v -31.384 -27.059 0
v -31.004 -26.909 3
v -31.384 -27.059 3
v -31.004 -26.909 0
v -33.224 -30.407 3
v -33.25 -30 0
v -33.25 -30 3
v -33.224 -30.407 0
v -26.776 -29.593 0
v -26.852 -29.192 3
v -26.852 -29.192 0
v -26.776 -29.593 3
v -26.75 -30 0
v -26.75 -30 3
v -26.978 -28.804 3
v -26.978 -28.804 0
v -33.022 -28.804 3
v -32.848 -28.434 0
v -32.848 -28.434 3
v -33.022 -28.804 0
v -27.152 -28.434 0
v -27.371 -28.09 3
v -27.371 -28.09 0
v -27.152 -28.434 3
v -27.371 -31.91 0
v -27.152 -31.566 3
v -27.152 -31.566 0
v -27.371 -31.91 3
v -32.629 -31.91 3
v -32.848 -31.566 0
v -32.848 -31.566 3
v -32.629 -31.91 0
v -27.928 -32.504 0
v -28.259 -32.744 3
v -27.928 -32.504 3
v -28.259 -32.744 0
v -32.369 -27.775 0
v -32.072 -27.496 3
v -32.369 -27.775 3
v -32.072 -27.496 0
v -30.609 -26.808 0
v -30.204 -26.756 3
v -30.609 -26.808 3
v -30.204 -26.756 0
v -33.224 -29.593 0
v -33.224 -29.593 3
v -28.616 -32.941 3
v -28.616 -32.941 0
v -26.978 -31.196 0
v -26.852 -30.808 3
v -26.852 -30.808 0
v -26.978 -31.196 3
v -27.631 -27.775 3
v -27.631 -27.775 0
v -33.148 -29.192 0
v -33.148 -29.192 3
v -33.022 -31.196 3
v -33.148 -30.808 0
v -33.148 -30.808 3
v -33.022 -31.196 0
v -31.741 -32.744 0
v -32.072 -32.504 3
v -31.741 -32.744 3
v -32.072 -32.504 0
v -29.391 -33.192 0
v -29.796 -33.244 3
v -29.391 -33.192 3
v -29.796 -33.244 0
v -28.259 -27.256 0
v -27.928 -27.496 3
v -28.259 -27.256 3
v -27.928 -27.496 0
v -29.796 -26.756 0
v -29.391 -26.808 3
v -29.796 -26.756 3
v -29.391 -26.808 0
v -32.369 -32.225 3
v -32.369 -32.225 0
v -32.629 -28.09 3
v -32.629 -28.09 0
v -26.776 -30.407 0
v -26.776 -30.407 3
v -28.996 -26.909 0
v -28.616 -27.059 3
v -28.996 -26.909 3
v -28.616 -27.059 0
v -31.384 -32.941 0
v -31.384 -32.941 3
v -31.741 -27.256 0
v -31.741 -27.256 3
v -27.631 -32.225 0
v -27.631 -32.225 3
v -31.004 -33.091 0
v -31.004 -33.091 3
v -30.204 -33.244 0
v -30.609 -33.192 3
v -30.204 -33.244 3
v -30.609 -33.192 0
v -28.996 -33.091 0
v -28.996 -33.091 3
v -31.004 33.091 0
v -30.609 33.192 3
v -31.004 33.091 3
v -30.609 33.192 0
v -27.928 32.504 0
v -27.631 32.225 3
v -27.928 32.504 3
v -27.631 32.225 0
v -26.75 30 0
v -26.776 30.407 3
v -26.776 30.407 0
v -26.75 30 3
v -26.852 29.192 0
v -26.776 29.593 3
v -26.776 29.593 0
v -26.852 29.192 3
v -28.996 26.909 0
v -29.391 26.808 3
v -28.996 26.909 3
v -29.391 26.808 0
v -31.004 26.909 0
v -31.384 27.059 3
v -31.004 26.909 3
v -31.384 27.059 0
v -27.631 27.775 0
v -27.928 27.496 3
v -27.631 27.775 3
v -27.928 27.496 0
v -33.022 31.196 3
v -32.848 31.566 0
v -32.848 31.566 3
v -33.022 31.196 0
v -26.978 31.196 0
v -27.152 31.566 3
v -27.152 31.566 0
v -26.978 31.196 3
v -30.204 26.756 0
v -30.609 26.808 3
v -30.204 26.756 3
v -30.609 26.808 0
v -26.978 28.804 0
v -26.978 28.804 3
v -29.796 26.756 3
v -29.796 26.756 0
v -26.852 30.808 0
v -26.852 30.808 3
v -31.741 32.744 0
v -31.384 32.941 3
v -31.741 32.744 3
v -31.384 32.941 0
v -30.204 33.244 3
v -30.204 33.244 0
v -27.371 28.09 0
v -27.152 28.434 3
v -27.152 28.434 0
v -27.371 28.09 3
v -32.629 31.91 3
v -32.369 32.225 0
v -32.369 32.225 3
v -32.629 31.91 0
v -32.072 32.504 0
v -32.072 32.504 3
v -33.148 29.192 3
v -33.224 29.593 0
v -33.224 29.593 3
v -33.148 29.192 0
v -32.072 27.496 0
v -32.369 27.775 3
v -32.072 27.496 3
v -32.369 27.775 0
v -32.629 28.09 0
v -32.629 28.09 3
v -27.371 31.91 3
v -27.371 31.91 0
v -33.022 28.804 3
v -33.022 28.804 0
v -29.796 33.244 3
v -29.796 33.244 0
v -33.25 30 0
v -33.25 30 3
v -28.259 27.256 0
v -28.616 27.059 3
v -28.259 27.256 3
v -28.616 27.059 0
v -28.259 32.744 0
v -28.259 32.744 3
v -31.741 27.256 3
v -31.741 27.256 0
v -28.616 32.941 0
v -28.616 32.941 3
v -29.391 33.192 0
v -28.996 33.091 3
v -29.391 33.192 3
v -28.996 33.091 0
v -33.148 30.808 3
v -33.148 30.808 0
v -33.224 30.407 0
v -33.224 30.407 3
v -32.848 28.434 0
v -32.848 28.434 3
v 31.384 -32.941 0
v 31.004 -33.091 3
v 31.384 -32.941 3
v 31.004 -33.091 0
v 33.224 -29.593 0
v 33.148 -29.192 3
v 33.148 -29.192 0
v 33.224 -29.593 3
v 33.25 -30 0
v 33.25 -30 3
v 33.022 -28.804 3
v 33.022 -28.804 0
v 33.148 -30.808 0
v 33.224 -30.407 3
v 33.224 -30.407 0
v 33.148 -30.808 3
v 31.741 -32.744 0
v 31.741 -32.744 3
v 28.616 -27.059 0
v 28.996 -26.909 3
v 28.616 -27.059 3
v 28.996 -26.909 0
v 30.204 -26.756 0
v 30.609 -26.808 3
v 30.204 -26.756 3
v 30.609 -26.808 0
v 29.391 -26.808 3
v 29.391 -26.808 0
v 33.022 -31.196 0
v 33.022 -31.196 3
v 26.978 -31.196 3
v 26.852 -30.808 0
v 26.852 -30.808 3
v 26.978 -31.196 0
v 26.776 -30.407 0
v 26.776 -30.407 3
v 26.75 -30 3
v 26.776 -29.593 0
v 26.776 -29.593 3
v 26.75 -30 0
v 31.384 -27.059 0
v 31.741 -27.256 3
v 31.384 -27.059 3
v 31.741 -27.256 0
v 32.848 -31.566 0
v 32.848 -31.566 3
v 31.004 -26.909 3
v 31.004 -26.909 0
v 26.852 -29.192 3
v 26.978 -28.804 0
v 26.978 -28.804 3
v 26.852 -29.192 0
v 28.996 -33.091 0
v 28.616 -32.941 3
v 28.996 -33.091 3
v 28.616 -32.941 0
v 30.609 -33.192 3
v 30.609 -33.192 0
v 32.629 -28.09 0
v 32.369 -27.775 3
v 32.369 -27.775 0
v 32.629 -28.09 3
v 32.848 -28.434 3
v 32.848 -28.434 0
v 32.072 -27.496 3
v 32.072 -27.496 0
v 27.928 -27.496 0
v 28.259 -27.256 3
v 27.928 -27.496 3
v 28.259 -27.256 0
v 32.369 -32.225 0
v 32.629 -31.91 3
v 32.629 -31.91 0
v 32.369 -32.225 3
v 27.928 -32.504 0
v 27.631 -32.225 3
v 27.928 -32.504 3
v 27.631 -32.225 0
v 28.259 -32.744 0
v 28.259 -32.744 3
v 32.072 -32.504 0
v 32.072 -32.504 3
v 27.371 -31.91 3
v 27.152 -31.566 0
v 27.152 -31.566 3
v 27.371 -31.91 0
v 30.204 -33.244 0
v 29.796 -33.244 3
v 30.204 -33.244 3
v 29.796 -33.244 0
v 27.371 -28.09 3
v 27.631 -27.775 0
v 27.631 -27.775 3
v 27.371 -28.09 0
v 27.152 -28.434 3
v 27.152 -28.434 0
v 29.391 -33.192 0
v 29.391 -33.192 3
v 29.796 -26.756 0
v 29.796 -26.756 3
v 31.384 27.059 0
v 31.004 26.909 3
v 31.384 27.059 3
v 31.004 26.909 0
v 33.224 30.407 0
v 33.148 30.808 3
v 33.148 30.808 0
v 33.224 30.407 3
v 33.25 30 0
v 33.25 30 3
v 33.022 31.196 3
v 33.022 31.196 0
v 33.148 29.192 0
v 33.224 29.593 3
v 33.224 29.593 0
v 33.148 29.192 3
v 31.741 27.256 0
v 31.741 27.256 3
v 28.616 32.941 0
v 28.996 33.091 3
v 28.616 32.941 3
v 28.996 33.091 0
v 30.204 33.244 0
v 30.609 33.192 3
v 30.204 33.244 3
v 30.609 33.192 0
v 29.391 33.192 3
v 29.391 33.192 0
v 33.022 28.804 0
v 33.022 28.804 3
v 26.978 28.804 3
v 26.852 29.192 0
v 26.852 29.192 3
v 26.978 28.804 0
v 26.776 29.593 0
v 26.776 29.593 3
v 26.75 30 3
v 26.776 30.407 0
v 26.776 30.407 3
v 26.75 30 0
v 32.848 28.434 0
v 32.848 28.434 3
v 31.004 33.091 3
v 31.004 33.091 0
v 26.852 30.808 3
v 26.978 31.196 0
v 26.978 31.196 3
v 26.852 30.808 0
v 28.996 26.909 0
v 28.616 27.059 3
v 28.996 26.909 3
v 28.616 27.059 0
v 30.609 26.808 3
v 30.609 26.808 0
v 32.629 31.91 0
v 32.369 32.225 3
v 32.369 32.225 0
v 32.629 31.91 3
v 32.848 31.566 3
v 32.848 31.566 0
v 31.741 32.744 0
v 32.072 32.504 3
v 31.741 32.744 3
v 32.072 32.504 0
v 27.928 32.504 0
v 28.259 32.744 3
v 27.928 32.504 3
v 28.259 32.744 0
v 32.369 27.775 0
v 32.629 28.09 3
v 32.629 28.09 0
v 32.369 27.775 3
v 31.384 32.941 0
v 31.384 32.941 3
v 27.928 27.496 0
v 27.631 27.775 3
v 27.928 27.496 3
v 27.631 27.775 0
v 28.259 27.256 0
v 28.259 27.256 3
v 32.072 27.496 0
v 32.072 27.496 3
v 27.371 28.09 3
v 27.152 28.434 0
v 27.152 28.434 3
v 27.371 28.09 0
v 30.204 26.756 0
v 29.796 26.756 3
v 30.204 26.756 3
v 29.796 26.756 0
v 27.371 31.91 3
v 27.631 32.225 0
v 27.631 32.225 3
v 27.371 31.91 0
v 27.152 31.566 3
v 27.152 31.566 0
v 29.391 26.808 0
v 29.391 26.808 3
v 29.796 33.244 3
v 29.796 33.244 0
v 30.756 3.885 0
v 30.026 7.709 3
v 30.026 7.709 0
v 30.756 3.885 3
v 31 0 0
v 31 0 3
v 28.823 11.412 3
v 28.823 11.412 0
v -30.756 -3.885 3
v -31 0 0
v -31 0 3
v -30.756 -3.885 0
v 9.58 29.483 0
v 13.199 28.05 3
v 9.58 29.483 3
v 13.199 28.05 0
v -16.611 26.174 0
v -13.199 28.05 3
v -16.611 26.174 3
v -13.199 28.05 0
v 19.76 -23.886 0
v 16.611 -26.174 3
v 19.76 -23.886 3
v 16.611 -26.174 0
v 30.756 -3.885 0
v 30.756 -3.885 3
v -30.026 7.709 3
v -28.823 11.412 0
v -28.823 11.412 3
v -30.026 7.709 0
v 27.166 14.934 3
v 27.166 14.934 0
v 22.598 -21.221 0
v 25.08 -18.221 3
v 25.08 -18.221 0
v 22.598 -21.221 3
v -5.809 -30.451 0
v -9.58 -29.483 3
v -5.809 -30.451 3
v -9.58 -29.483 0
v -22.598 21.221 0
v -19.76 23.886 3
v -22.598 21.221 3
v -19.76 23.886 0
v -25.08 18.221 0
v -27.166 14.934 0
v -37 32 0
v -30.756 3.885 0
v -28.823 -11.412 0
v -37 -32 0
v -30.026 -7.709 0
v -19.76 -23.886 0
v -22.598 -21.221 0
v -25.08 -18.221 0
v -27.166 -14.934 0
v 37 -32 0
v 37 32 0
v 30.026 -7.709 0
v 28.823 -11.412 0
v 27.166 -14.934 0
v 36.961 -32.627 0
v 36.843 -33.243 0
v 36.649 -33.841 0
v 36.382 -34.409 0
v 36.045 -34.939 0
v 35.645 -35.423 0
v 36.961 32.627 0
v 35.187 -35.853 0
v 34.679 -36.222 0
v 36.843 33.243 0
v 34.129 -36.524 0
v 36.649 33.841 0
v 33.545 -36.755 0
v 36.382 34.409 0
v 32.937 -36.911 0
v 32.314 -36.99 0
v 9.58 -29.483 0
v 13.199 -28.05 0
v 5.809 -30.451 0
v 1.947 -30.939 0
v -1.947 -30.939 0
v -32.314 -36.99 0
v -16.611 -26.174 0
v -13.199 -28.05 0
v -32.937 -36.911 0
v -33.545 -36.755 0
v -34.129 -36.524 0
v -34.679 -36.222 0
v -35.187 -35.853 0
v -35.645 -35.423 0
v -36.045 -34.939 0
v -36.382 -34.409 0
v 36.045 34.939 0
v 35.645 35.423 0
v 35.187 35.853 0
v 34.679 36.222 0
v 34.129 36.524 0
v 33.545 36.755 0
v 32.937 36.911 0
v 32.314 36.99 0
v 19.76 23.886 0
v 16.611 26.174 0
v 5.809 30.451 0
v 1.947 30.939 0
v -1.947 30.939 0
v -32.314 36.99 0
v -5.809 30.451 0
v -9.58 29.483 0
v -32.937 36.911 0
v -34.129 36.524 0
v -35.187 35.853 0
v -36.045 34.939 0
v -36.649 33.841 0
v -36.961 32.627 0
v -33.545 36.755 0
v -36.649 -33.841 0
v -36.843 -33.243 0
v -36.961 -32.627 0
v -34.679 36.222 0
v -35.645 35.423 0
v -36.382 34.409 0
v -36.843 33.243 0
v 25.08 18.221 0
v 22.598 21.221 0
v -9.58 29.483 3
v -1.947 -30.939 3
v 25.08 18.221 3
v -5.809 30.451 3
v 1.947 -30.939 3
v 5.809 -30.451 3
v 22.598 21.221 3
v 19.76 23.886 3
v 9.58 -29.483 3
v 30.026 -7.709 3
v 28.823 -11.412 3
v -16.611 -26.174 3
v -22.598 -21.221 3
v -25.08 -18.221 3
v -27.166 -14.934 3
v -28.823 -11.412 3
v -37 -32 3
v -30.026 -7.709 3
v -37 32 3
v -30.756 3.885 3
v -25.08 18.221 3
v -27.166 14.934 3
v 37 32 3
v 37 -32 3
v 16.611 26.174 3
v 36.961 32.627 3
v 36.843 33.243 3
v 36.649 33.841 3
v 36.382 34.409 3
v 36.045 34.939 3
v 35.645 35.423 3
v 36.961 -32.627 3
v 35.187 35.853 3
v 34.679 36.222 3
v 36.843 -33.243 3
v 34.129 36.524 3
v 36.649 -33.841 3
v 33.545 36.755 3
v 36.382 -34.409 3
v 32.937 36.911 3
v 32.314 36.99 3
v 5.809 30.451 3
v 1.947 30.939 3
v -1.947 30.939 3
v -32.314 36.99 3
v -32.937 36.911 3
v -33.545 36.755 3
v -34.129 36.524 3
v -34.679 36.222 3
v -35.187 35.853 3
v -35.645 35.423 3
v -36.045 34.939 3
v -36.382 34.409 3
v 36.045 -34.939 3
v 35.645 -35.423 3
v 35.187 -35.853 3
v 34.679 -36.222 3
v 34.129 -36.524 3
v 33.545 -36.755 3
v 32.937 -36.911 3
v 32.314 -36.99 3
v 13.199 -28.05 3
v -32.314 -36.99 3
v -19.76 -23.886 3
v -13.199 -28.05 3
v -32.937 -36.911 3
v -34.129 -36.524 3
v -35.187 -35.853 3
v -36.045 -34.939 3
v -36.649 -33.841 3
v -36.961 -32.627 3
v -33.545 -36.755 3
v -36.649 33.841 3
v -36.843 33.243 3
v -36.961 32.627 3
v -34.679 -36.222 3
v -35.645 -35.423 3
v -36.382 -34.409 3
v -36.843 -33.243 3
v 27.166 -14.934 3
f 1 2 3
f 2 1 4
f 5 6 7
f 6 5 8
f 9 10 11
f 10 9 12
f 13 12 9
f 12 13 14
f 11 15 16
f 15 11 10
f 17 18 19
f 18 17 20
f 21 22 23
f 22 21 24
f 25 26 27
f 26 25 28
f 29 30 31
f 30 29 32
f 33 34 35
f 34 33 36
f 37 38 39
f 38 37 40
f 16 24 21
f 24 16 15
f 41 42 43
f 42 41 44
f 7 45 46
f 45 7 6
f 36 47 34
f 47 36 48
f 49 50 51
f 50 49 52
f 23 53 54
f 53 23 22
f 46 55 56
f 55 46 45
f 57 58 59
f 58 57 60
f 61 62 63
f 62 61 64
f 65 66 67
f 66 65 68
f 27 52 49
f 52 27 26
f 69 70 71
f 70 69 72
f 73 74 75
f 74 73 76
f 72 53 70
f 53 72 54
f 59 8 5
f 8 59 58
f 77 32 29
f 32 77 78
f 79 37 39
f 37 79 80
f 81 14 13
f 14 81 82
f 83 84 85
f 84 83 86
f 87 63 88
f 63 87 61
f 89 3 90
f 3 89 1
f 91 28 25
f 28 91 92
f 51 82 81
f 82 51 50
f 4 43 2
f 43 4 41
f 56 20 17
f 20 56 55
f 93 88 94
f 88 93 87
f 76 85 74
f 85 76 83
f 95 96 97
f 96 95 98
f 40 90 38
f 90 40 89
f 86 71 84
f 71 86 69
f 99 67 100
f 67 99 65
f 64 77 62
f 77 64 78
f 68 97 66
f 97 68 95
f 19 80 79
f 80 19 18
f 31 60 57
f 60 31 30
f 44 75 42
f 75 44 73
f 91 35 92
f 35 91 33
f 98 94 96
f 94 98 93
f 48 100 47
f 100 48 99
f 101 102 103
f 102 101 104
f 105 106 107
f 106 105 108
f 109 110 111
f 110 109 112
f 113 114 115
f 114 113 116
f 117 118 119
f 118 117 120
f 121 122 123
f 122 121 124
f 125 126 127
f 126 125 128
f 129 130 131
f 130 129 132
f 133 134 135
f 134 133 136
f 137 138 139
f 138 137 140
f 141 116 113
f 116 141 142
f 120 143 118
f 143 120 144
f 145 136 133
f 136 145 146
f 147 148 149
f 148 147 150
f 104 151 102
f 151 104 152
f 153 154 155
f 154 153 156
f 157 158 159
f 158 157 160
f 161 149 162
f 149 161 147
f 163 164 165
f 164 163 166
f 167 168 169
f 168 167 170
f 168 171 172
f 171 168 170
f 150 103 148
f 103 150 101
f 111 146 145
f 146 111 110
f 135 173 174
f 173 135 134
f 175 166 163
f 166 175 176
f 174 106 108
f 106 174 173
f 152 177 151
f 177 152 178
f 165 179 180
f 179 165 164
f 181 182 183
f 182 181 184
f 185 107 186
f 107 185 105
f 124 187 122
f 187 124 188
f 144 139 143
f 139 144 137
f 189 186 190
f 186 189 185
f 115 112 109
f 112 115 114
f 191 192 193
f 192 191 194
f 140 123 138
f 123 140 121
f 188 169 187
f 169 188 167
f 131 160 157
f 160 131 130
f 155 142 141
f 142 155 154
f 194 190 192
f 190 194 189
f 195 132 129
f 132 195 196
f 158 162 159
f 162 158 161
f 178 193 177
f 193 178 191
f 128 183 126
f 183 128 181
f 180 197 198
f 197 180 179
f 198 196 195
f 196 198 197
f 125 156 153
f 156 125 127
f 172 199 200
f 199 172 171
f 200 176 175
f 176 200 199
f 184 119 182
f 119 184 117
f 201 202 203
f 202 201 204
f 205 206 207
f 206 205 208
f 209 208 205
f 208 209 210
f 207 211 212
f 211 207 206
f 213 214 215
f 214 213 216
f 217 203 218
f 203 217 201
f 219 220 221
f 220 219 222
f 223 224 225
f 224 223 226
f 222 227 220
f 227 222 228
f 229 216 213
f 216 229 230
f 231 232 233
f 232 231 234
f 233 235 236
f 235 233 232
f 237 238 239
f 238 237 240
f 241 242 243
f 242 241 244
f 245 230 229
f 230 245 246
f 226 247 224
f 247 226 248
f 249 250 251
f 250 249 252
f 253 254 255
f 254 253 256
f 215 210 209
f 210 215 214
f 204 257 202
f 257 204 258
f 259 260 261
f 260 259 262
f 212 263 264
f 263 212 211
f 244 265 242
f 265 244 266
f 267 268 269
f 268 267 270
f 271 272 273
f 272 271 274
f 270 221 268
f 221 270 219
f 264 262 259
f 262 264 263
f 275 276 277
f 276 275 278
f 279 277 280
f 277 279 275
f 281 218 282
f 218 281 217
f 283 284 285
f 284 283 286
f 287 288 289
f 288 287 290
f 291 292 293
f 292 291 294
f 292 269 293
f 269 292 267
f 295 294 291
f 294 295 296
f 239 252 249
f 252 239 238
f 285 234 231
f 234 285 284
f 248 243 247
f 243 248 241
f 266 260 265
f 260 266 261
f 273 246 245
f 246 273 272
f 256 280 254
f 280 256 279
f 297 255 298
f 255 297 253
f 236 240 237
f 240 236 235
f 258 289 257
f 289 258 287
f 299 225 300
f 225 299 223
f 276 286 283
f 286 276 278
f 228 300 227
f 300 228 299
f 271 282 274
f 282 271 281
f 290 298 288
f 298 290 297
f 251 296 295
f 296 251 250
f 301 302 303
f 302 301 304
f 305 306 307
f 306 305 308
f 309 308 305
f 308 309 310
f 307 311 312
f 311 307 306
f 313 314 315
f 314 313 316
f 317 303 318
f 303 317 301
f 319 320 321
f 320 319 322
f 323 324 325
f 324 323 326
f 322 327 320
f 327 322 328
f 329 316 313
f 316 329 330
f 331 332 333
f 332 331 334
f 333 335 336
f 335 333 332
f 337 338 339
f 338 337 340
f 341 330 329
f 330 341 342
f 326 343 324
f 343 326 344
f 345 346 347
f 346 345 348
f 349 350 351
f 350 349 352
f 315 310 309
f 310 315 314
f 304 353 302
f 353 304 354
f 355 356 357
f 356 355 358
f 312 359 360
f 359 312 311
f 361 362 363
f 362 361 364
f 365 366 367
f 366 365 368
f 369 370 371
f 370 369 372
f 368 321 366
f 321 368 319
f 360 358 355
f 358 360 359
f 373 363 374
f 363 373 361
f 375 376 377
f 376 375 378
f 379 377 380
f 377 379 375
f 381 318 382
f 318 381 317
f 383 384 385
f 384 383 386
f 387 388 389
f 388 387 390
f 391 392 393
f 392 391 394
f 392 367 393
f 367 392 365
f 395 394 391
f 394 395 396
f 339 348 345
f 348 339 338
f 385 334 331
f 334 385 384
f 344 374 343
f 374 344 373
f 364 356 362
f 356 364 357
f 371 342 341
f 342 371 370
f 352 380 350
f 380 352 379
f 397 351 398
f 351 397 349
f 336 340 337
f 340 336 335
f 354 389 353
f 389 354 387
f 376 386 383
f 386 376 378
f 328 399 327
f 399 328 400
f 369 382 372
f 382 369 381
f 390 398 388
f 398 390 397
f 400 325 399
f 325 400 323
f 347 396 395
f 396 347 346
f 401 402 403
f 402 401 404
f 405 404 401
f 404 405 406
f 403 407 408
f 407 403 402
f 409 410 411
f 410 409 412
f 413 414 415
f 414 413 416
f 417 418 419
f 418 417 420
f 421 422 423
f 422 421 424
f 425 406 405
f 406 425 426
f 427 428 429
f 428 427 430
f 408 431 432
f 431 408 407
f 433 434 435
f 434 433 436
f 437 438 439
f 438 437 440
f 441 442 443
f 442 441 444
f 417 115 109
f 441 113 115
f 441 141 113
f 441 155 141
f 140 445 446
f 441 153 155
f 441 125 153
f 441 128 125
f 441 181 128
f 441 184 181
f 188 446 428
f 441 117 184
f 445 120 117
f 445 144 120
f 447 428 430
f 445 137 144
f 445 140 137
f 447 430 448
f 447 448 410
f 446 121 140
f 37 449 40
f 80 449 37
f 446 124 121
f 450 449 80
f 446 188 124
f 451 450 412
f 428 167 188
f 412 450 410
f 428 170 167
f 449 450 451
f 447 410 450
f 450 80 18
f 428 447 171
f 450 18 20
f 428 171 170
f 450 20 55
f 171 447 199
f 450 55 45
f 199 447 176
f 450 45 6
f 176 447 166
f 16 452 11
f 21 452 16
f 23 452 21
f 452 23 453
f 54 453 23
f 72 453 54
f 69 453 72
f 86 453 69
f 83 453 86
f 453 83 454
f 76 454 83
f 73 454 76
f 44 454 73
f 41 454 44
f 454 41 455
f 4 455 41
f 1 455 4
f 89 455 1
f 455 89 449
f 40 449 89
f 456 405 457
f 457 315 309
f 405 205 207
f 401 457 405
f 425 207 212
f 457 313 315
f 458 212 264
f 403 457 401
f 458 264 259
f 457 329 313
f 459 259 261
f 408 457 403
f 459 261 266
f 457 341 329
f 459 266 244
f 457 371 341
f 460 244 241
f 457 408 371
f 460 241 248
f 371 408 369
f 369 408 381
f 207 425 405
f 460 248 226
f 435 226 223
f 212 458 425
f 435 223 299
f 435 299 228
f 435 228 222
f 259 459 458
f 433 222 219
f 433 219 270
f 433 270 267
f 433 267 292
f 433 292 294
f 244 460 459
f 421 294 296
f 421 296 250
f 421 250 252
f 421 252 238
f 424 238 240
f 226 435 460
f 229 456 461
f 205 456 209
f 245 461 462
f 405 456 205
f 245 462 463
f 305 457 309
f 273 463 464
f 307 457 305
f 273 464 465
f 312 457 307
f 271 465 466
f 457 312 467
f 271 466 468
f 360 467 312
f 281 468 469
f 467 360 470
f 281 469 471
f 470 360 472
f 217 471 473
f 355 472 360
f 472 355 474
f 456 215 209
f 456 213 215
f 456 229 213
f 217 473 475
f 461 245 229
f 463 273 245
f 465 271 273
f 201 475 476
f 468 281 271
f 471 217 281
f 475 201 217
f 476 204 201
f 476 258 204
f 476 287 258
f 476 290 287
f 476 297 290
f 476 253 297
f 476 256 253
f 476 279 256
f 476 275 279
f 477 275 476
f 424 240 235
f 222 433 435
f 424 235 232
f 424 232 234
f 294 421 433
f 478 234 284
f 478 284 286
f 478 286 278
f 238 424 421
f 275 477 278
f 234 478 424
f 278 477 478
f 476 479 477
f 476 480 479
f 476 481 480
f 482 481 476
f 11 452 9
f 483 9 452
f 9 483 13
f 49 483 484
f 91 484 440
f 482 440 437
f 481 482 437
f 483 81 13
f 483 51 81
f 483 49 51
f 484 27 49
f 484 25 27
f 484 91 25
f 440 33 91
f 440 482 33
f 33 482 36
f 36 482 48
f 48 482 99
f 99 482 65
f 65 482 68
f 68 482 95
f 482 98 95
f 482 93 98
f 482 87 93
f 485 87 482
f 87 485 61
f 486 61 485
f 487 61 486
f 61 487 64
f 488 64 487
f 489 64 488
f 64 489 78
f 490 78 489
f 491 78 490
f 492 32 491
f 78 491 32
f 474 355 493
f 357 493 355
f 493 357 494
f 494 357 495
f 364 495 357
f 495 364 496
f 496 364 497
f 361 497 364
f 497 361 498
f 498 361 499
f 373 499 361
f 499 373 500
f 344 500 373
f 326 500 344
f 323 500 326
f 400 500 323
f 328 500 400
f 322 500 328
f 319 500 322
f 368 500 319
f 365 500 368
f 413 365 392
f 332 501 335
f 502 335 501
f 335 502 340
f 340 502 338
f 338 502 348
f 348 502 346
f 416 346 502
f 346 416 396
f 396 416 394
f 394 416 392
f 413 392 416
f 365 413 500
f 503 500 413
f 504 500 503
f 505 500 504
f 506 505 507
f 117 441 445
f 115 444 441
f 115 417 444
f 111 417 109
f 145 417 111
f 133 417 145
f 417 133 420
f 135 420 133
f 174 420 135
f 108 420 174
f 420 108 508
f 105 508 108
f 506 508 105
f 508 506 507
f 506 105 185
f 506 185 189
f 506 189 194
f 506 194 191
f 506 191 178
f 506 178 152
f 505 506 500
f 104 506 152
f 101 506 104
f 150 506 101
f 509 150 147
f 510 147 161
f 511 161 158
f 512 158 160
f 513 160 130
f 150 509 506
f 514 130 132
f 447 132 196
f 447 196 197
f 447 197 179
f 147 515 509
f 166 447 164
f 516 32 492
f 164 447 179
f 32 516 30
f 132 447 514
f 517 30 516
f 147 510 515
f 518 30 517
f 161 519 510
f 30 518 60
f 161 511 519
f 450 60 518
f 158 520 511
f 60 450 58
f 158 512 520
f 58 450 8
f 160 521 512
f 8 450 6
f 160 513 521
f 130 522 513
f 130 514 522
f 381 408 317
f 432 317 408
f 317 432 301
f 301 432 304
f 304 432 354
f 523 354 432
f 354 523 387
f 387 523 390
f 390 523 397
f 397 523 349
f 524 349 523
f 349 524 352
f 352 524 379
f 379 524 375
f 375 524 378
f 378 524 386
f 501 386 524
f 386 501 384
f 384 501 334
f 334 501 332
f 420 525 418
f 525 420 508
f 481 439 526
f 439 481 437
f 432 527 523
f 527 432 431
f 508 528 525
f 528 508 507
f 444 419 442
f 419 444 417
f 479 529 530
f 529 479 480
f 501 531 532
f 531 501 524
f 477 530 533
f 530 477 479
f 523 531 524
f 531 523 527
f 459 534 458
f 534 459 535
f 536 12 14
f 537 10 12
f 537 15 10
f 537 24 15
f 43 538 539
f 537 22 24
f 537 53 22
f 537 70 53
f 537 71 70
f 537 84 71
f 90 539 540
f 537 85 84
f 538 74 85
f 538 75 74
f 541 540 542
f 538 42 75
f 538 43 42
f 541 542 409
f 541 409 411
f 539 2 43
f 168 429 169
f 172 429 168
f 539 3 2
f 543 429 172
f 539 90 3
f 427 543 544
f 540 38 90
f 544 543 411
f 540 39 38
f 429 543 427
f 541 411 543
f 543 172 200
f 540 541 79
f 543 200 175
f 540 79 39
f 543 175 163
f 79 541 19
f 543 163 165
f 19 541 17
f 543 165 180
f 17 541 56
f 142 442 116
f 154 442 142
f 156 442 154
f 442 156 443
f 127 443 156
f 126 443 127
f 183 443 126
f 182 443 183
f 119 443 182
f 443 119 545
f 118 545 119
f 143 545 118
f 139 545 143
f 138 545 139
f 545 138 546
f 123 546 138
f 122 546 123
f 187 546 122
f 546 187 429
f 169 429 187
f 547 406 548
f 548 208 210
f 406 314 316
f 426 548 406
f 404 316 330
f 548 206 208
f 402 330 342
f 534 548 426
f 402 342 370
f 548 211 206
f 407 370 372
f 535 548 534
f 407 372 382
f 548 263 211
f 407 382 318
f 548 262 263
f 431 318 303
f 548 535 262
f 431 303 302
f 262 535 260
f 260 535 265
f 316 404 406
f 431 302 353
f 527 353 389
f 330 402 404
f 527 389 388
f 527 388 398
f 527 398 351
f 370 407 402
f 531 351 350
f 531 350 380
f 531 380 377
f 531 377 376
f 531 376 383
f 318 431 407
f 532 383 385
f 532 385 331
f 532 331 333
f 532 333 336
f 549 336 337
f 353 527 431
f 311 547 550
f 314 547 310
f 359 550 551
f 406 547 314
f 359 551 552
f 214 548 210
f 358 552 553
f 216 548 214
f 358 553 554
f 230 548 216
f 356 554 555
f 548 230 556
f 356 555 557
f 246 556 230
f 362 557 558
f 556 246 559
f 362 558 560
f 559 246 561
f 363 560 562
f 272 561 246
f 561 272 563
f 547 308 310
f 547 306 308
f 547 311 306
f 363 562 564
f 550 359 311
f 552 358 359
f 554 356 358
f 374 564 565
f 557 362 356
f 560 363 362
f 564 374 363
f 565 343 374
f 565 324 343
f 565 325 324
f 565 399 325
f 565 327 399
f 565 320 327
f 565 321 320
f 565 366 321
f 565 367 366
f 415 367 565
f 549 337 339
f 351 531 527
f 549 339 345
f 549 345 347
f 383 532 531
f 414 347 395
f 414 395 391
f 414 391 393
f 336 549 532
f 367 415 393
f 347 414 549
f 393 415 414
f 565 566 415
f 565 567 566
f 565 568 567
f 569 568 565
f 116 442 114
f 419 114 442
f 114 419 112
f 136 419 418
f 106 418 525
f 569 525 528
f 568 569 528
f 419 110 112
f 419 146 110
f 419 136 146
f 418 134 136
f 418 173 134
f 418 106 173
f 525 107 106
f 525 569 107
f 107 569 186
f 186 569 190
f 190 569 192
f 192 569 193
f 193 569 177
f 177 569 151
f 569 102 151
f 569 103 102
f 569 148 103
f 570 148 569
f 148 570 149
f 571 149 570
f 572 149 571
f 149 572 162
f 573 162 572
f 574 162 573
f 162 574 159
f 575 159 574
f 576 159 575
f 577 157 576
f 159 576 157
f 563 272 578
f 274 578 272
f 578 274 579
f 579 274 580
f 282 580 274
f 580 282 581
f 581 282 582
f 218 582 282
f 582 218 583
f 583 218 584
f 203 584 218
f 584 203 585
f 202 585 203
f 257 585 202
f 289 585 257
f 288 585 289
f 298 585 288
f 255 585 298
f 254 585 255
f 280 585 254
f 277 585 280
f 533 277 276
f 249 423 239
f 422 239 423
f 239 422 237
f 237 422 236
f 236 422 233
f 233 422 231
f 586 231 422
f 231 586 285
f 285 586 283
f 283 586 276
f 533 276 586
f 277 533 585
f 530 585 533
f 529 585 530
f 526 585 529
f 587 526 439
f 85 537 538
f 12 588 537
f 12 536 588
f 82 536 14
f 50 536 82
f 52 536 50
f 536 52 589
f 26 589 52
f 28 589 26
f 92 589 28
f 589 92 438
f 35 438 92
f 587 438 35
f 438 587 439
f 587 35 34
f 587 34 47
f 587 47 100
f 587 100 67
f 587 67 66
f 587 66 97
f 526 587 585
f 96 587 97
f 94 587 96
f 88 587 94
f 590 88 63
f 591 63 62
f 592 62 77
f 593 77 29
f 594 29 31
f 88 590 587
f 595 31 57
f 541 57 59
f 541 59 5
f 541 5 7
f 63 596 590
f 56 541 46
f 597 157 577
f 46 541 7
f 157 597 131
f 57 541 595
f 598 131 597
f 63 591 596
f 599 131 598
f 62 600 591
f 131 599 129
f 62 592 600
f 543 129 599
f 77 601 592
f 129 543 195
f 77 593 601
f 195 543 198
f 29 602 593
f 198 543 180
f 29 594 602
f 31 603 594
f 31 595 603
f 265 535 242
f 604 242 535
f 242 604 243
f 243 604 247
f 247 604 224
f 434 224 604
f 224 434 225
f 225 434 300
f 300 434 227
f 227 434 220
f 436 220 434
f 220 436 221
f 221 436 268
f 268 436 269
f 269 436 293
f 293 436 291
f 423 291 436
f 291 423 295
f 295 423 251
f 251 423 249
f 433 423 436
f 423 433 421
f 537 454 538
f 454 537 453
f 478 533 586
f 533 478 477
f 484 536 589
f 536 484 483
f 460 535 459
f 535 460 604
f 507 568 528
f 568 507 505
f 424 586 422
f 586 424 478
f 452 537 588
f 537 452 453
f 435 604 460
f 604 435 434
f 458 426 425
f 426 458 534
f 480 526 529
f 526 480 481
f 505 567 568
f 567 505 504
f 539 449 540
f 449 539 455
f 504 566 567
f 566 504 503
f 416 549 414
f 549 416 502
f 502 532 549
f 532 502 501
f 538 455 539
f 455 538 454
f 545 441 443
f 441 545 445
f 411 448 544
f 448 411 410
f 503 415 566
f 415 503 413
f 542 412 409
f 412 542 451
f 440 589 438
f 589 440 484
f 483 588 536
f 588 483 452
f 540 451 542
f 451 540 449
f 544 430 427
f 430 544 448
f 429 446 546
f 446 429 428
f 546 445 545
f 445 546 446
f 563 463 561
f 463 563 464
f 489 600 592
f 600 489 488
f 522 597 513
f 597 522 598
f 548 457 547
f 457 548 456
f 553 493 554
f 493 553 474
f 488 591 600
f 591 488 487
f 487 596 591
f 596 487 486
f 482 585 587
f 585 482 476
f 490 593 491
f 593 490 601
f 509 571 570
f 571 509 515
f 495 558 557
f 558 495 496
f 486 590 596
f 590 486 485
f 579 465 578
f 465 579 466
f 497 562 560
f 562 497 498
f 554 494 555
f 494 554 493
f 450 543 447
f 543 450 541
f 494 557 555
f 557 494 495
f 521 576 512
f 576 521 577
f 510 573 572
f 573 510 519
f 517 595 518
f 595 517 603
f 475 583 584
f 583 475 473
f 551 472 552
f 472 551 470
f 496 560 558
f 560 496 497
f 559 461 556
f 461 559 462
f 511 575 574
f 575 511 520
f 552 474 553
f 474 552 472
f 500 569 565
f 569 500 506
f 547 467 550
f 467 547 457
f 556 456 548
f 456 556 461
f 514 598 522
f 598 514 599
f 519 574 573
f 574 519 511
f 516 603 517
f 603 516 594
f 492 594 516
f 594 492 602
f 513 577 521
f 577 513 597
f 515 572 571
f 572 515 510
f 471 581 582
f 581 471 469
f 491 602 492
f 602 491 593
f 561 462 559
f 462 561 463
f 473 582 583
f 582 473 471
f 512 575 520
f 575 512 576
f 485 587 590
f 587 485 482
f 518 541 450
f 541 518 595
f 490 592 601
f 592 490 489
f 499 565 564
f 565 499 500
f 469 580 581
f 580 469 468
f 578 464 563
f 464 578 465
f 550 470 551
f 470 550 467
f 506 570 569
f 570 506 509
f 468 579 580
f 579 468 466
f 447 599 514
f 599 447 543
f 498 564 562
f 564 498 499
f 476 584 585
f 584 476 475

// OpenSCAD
$fn = 50;


difference() {
	union() {
		hull() {
			translate(v = [-32.0000000000, 32.0000000000, 0]) {
				cylinder(h = 3, r = 5);
			}
			translate(v = [32.0000000000, 32.0000000000, 0]) {
				cylinder(h = 3, r = 5);
			}
			translate(v = [-32.0000000000, -32.0000000000, 0]) {
				cylinder(h = 3, r = 5);
			}
			translate(v = [32.0000000000, -32.0000000000, 0]) {
				cylinder(h = 3, r = 5);
			}
		}
	}
	union() {
		#translate(v = [-30.0000000000, -30.0000000000, -100.0000000000]) {
			cylinder(h = 200, r = 3.2500000000);
		}
		#translate(v = [-30.0000000000, 30.0000000000, -100.0000000000]) {
			cylinder(h = 200, r = 3.2500000000);
		}
		#translate(v = [30.0000000000, -30.0000000000, -100.0000000000]) {
			cylinder(h = 200, r = 3.2500000000);
		}
		#translate(v = [30.0000000000, 30.0000000000, -100.0000000000]) {
			cylinder(h = 200, r = 3.2500000000);
		}
		#cylinder(h = 3, r = 31.0000000000);
	}
}
